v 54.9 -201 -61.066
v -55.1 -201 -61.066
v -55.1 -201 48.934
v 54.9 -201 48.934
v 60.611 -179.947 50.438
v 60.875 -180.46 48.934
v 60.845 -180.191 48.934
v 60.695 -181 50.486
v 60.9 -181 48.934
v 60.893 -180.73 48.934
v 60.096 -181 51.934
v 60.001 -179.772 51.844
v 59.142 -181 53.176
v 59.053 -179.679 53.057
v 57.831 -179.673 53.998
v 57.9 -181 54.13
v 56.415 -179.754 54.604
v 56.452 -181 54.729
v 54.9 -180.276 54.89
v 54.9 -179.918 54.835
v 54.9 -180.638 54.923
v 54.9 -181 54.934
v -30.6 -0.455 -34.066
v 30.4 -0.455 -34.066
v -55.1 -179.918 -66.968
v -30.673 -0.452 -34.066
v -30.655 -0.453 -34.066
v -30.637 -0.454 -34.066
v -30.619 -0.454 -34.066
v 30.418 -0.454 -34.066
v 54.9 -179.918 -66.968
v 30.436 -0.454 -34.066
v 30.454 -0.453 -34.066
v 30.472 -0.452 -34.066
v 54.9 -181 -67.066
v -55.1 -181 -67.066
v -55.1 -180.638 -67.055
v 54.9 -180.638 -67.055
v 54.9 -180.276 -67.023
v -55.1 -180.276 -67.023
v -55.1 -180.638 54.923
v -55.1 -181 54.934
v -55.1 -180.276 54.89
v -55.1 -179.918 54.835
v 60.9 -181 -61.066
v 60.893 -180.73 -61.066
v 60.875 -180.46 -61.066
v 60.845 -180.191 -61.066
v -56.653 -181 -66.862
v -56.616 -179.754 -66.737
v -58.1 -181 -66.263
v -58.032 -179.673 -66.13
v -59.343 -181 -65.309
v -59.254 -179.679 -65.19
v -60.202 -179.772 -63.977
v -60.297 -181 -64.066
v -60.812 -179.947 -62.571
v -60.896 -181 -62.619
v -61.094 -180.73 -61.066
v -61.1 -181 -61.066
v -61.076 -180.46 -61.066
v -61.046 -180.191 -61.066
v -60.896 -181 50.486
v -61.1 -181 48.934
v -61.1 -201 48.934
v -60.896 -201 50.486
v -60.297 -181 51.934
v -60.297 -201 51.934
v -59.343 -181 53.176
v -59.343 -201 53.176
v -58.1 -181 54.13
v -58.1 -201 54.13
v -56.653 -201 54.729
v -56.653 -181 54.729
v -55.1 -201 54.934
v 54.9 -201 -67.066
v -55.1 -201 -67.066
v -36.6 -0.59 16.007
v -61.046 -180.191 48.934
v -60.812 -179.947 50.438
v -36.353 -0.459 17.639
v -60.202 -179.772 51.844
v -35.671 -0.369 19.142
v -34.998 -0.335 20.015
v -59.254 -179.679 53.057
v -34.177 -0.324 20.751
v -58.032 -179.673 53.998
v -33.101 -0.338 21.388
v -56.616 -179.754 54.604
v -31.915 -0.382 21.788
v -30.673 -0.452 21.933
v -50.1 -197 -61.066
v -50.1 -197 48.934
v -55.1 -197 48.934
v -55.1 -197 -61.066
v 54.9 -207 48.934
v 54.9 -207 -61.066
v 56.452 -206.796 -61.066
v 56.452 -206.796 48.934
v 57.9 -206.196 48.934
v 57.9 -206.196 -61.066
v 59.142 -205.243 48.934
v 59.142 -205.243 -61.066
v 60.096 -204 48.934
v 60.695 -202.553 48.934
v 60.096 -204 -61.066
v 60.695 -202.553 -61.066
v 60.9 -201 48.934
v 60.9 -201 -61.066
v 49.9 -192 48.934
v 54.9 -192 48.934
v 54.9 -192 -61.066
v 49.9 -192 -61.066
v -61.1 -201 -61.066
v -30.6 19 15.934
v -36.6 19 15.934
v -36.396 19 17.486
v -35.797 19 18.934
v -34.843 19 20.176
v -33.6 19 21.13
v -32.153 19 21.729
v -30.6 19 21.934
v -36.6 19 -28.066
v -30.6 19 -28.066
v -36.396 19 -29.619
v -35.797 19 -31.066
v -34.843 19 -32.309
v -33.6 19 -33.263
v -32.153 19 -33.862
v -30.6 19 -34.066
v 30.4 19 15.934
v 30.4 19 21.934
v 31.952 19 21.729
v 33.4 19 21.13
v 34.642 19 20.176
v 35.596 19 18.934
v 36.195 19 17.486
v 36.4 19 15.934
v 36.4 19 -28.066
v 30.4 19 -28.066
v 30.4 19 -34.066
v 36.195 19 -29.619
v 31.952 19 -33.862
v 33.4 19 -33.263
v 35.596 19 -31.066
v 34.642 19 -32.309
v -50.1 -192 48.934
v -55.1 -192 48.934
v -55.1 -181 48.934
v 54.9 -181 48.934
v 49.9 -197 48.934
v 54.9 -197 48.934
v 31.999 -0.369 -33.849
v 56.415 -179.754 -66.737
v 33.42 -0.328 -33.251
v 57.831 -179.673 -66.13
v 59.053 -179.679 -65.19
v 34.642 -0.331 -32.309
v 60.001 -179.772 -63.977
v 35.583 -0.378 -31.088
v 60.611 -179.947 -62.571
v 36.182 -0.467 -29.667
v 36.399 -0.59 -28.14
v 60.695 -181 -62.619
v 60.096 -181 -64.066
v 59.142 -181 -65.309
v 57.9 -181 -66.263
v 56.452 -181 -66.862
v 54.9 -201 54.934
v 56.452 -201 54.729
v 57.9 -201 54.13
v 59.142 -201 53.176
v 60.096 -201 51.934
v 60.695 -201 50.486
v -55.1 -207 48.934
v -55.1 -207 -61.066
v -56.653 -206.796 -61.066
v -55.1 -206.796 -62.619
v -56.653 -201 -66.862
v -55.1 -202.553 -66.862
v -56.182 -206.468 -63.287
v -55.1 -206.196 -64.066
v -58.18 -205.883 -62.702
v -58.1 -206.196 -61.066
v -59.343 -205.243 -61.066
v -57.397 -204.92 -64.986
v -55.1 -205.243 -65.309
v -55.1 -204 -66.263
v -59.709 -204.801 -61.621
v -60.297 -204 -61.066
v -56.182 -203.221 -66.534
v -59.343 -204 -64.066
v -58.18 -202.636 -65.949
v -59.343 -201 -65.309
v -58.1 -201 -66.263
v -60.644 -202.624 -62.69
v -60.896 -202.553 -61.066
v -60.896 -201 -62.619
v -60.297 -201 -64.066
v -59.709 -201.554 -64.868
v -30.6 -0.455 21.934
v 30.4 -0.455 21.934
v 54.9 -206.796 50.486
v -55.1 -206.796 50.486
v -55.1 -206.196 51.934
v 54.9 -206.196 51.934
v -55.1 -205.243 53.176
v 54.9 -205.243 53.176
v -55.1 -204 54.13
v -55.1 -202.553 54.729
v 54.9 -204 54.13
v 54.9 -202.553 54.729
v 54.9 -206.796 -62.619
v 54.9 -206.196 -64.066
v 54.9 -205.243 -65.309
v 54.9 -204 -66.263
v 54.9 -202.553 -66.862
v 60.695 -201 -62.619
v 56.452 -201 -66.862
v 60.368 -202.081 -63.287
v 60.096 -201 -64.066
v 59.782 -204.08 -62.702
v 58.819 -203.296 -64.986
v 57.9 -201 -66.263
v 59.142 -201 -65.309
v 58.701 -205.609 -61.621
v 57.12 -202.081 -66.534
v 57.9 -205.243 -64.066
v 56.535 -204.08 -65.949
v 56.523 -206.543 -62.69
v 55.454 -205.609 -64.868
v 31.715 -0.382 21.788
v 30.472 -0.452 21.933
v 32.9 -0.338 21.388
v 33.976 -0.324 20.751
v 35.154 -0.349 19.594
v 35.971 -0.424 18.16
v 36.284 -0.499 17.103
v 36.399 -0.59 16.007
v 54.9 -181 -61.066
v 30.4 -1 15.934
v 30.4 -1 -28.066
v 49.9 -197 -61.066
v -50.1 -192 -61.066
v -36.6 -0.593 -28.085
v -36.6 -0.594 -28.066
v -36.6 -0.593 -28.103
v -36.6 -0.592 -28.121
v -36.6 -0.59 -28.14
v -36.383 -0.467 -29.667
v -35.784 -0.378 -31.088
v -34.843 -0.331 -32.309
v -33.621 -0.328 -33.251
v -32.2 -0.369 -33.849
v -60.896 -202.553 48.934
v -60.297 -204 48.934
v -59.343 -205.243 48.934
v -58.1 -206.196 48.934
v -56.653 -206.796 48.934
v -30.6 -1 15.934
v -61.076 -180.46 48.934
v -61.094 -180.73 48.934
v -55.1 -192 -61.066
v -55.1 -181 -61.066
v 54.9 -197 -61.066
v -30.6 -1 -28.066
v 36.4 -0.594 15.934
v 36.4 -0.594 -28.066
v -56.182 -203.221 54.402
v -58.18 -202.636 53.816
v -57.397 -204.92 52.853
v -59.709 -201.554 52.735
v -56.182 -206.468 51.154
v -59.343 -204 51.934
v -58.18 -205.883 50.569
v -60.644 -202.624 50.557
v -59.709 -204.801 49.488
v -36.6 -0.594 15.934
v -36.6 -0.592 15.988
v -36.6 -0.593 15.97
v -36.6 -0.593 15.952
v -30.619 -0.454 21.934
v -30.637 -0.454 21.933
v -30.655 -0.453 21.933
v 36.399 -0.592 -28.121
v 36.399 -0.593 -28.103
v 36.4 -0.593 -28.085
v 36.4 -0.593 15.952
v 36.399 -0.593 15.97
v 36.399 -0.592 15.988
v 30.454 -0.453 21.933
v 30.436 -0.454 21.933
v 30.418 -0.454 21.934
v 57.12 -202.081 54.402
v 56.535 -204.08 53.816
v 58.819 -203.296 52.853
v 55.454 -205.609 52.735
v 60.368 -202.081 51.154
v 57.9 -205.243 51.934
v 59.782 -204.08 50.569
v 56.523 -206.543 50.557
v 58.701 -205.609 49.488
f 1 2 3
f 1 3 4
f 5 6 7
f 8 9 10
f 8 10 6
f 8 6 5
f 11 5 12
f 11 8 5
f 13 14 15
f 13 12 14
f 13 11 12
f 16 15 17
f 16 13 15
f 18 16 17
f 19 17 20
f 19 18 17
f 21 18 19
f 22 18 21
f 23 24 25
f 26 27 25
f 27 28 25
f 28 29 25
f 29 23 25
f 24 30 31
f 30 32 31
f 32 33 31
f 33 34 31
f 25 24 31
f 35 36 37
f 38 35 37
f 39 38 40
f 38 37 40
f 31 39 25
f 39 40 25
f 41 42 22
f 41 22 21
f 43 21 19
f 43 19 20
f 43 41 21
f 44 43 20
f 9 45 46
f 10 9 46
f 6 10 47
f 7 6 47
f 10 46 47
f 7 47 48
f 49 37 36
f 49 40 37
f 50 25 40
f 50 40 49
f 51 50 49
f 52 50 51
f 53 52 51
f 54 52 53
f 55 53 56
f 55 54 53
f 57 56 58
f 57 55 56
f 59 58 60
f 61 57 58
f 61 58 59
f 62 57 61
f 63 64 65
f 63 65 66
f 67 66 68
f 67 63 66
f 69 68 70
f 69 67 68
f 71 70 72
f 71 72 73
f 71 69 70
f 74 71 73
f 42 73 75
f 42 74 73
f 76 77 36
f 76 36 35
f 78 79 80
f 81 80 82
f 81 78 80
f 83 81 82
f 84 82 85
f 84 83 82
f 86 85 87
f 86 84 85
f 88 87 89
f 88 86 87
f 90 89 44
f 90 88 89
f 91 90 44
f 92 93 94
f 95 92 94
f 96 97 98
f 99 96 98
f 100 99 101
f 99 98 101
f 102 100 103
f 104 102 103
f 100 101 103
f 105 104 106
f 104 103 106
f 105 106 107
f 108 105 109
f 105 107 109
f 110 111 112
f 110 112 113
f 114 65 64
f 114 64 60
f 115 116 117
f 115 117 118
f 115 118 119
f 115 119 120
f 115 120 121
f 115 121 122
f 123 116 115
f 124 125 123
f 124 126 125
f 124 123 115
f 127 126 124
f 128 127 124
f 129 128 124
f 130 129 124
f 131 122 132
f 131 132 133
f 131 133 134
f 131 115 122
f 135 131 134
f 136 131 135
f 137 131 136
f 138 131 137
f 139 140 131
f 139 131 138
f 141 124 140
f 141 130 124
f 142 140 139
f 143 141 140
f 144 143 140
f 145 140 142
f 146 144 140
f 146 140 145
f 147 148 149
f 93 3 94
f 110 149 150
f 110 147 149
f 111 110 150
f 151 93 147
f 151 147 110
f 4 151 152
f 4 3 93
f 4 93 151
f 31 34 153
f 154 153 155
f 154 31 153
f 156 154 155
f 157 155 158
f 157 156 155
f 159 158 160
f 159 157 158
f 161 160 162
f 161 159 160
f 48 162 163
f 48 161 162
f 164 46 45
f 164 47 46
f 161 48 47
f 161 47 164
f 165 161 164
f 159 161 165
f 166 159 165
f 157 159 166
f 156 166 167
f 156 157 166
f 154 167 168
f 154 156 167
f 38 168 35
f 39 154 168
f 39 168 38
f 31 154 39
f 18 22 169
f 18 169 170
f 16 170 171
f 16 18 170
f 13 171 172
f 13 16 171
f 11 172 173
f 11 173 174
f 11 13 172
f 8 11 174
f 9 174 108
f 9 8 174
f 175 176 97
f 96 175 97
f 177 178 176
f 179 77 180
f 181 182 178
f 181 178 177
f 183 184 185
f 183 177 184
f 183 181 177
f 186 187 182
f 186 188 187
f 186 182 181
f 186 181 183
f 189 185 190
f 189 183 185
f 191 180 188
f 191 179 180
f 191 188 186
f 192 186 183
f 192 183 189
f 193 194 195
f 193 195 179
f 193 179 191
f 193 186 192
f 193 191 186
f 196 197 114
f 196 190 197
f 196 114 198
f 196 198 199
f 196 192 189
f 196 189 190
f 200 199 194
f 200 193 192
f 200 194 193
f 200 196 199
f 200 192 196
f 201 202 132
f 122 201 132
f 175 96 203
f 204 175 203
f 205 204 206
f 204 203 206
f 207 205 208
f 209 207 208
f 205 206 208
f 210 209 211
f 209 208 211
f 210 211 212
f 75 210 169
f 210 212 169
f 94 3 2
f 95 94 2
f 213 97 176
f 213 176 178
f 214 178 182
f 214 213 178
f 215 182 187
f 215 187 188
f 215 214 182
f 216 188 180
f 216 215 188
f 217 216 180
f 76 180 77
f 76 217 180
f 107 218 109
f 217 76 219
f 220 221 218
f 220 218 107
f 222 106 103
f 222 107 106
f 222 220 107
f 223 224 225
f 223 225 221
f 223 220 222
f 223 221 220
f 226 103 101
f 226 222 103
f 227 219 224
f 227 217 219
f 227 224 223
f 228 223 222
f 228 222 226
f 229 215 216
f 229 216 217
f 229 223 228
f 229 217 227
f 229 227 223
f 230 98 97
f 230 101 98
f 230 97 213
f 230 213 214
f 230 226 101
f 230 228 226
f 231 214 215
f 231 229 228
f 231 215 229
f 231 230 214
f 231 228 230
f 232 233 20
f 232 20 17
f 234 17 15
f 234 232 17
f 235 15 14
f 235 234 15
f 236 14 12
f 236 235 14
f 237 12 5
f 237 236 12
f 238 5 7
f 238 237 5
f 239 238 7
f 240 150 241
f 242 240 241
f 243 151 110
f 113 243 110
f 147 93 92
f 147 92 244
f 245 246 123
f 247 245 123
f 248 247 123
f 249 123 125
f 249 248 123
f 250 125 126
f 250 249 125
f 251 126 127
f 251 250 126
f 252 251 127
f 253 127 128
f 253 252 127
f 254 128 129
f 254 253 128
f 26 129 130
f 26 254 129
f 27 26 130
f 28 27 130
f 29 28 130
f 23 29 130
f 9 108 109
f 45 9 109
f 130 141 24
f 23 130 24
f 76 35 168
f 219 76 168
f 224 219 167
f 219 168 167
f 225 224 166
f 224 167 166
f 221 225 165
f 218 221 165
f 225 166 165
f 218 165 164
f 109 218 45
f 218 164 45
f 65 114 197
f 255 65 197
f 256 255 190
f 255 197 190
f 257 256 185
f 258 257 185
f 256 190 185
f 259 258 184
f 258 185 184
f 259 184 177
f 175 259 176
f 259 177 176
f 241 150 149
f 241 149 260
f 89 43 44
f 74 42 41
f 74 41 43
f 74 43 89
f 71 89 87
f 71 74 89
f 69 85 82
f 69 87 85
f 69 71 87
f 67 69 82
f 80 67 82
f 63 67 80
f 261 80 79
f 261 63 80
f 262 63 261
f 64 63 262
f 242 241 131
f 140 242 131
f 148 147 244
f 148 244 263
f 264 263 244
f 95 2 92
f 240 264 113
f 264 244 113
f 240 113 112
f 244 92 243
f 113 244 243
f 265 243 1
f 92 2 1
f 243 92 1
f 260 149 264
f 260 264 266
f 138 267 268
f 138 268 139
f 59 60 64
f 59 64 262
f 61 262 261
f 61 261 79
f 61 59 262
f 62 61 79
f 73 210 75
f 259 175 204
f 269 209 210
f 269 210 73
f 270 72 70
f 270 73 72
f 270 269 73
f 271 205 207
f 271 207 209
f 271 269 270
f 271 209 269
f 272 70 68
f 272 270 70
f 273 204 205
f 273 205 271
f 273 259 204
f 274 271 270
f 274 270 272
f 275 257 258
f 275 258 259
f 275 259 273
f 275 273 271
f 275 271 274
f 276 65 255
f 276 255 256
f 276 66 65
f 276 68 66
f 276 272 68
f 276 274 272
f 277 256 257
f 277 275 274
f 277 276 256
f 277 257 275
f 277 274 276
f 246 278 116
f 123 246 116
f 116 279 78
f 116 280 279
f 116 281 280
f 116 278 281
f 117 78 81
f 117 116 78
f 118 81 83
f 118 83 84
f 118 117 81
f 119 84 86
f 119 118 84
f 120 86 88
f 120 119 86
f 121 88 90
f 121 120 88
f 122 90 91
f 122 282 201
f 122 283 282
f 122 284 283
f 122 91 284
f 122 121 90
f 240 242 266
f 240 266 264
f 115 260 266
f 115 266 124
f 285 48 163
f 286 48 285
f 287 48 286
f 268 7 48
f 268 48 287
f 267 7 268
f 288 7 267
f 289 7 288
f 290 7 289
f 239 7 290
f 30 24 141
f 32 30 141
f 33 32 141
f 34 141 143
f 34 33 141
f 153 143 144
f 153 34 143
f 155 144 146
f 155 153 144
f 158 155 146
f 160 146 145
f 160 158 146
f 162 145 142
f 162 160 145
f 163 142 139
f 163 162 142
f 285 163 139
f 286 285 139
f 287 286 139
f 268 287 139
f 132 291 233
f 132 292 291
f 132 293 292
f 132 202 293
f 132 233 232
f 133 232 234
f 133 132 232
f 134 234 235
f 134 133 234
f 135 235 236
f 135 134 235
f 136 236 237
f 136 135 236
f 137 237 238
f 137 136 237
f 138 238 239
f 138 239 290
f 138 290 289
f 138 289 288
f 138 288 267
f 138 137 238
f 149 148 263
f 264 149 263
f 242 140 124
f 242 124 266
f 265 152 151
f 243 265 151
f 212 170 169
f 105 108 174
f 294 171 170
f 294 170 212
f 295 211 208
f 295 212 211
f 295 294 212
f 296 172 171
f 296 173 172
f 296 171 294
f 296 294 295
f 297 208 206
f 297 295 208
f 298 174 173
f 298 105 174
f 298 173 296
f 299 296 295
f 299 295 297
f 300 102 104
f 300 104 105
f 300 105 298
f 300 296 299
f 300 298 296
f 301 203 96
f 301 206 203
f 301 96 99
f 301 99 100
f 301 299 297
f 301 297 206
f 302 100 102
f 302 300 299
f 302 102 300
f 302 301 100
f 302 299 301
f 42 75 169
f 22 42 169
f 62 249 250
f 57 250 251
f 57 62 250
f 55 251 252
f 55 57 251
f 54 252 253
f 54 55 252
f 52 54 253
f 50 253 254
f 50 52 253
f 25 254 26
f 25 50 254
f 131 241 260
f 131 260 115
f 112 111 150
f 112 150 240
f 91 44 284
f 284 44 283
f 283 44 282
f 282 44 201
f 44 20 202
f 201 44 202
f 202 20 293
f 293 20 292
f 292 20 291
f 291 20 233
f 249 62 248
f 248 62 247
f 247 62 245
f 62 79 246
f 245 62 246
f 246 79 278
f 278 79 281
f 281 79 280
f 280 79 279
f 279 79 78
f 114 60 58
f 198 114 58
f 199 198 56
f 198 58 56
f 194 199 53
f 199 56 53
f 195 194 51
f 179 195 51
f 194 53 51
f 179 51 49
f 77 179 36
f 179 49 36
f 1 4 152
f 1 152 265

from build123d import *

# Parameters (mm, degrees)
SKETCH080_W             = 110
SKETCH080_H             = 110
PAD051_DEPTH            = 220
POCKET036_DEPTH         = 158
POCKET037_DEPTH         = 158
THICKNESS002_T          = 6
SKETCH079_W             = 5
SKETCH079_H             = 5
PAD052_DEPTH            = 110
BODY012_PLACEMENT_ANGLE = 90


with BuildPart() as part:
    # Sketch080 → Pad051 (new body)
    with BuildSketch(Plane.XY):
        Rectangle(SKETCH080_W, SKETCH080_H)
    extrude(amount=PAD051_DEPTH)

    # Sketch081 (on Face3 of Pad051) → Pocket036 (cut)
    with BuildSketch(Plane.XZ.offset(55)):
        Polygon((-55, 20), (-30.5, 200), (-30.5, 220), (-55, 220), align=None)
        Polygon((30.5, 220), (55, 220), (55, 20), (30.5, 200), align=None)
    extrude(amount=-POCKET036_DEPTH, mode=Mode.SUBTRACT)

    # Sketch082 (on DatumPlane) → Pocket037 (cut)
    with BuildSketch(Plane.YZ.offset(55)):
        Polygon((-55, 20), (-22, 200), (-22, 220), (-55, 220), align=None)
        Polygon((22, 220), (22, 200), (55, 20), (55, 220), align=None)
    extrude(amount=-POCKET037_DEPTH, mode=Mode.SUBTRACT)

    # Thickness002
    thickness002_openings = [part.faces().sort_by_distance(p)[0] for p in [
        (0, 0, 220),
    ]]
    offset(amount=THICKNESS002_T, openings=thickness002_openings)

    # Sketch079 → Pad052 (join)
    with BuildSketch(Plane(origin=(0, -55, 0), x_dir=(-1, 0, 0), z_dir=(0, 1, 0))):
        with Locations((-52.5, 6.5)):
            Rectangle(SKETCH079_W, SKETCH079_H)
        with Locations((52.5, 6.5)):
            Rectangle(SKETCH079_W, SKETCH079_H)
    extrude(amount=PAD052_DEPTH)


with BuildPart() as part_1:
    # Body012 placement: moved
    add(part.part.moved(Location((-0.100429, -201, -6.066442))).rotate(Axis((-0.100429, -201, -6.066442), (-1, 0, 0)), BODY012_PLACEMENT_ANGLE))


solid = part_1.part
